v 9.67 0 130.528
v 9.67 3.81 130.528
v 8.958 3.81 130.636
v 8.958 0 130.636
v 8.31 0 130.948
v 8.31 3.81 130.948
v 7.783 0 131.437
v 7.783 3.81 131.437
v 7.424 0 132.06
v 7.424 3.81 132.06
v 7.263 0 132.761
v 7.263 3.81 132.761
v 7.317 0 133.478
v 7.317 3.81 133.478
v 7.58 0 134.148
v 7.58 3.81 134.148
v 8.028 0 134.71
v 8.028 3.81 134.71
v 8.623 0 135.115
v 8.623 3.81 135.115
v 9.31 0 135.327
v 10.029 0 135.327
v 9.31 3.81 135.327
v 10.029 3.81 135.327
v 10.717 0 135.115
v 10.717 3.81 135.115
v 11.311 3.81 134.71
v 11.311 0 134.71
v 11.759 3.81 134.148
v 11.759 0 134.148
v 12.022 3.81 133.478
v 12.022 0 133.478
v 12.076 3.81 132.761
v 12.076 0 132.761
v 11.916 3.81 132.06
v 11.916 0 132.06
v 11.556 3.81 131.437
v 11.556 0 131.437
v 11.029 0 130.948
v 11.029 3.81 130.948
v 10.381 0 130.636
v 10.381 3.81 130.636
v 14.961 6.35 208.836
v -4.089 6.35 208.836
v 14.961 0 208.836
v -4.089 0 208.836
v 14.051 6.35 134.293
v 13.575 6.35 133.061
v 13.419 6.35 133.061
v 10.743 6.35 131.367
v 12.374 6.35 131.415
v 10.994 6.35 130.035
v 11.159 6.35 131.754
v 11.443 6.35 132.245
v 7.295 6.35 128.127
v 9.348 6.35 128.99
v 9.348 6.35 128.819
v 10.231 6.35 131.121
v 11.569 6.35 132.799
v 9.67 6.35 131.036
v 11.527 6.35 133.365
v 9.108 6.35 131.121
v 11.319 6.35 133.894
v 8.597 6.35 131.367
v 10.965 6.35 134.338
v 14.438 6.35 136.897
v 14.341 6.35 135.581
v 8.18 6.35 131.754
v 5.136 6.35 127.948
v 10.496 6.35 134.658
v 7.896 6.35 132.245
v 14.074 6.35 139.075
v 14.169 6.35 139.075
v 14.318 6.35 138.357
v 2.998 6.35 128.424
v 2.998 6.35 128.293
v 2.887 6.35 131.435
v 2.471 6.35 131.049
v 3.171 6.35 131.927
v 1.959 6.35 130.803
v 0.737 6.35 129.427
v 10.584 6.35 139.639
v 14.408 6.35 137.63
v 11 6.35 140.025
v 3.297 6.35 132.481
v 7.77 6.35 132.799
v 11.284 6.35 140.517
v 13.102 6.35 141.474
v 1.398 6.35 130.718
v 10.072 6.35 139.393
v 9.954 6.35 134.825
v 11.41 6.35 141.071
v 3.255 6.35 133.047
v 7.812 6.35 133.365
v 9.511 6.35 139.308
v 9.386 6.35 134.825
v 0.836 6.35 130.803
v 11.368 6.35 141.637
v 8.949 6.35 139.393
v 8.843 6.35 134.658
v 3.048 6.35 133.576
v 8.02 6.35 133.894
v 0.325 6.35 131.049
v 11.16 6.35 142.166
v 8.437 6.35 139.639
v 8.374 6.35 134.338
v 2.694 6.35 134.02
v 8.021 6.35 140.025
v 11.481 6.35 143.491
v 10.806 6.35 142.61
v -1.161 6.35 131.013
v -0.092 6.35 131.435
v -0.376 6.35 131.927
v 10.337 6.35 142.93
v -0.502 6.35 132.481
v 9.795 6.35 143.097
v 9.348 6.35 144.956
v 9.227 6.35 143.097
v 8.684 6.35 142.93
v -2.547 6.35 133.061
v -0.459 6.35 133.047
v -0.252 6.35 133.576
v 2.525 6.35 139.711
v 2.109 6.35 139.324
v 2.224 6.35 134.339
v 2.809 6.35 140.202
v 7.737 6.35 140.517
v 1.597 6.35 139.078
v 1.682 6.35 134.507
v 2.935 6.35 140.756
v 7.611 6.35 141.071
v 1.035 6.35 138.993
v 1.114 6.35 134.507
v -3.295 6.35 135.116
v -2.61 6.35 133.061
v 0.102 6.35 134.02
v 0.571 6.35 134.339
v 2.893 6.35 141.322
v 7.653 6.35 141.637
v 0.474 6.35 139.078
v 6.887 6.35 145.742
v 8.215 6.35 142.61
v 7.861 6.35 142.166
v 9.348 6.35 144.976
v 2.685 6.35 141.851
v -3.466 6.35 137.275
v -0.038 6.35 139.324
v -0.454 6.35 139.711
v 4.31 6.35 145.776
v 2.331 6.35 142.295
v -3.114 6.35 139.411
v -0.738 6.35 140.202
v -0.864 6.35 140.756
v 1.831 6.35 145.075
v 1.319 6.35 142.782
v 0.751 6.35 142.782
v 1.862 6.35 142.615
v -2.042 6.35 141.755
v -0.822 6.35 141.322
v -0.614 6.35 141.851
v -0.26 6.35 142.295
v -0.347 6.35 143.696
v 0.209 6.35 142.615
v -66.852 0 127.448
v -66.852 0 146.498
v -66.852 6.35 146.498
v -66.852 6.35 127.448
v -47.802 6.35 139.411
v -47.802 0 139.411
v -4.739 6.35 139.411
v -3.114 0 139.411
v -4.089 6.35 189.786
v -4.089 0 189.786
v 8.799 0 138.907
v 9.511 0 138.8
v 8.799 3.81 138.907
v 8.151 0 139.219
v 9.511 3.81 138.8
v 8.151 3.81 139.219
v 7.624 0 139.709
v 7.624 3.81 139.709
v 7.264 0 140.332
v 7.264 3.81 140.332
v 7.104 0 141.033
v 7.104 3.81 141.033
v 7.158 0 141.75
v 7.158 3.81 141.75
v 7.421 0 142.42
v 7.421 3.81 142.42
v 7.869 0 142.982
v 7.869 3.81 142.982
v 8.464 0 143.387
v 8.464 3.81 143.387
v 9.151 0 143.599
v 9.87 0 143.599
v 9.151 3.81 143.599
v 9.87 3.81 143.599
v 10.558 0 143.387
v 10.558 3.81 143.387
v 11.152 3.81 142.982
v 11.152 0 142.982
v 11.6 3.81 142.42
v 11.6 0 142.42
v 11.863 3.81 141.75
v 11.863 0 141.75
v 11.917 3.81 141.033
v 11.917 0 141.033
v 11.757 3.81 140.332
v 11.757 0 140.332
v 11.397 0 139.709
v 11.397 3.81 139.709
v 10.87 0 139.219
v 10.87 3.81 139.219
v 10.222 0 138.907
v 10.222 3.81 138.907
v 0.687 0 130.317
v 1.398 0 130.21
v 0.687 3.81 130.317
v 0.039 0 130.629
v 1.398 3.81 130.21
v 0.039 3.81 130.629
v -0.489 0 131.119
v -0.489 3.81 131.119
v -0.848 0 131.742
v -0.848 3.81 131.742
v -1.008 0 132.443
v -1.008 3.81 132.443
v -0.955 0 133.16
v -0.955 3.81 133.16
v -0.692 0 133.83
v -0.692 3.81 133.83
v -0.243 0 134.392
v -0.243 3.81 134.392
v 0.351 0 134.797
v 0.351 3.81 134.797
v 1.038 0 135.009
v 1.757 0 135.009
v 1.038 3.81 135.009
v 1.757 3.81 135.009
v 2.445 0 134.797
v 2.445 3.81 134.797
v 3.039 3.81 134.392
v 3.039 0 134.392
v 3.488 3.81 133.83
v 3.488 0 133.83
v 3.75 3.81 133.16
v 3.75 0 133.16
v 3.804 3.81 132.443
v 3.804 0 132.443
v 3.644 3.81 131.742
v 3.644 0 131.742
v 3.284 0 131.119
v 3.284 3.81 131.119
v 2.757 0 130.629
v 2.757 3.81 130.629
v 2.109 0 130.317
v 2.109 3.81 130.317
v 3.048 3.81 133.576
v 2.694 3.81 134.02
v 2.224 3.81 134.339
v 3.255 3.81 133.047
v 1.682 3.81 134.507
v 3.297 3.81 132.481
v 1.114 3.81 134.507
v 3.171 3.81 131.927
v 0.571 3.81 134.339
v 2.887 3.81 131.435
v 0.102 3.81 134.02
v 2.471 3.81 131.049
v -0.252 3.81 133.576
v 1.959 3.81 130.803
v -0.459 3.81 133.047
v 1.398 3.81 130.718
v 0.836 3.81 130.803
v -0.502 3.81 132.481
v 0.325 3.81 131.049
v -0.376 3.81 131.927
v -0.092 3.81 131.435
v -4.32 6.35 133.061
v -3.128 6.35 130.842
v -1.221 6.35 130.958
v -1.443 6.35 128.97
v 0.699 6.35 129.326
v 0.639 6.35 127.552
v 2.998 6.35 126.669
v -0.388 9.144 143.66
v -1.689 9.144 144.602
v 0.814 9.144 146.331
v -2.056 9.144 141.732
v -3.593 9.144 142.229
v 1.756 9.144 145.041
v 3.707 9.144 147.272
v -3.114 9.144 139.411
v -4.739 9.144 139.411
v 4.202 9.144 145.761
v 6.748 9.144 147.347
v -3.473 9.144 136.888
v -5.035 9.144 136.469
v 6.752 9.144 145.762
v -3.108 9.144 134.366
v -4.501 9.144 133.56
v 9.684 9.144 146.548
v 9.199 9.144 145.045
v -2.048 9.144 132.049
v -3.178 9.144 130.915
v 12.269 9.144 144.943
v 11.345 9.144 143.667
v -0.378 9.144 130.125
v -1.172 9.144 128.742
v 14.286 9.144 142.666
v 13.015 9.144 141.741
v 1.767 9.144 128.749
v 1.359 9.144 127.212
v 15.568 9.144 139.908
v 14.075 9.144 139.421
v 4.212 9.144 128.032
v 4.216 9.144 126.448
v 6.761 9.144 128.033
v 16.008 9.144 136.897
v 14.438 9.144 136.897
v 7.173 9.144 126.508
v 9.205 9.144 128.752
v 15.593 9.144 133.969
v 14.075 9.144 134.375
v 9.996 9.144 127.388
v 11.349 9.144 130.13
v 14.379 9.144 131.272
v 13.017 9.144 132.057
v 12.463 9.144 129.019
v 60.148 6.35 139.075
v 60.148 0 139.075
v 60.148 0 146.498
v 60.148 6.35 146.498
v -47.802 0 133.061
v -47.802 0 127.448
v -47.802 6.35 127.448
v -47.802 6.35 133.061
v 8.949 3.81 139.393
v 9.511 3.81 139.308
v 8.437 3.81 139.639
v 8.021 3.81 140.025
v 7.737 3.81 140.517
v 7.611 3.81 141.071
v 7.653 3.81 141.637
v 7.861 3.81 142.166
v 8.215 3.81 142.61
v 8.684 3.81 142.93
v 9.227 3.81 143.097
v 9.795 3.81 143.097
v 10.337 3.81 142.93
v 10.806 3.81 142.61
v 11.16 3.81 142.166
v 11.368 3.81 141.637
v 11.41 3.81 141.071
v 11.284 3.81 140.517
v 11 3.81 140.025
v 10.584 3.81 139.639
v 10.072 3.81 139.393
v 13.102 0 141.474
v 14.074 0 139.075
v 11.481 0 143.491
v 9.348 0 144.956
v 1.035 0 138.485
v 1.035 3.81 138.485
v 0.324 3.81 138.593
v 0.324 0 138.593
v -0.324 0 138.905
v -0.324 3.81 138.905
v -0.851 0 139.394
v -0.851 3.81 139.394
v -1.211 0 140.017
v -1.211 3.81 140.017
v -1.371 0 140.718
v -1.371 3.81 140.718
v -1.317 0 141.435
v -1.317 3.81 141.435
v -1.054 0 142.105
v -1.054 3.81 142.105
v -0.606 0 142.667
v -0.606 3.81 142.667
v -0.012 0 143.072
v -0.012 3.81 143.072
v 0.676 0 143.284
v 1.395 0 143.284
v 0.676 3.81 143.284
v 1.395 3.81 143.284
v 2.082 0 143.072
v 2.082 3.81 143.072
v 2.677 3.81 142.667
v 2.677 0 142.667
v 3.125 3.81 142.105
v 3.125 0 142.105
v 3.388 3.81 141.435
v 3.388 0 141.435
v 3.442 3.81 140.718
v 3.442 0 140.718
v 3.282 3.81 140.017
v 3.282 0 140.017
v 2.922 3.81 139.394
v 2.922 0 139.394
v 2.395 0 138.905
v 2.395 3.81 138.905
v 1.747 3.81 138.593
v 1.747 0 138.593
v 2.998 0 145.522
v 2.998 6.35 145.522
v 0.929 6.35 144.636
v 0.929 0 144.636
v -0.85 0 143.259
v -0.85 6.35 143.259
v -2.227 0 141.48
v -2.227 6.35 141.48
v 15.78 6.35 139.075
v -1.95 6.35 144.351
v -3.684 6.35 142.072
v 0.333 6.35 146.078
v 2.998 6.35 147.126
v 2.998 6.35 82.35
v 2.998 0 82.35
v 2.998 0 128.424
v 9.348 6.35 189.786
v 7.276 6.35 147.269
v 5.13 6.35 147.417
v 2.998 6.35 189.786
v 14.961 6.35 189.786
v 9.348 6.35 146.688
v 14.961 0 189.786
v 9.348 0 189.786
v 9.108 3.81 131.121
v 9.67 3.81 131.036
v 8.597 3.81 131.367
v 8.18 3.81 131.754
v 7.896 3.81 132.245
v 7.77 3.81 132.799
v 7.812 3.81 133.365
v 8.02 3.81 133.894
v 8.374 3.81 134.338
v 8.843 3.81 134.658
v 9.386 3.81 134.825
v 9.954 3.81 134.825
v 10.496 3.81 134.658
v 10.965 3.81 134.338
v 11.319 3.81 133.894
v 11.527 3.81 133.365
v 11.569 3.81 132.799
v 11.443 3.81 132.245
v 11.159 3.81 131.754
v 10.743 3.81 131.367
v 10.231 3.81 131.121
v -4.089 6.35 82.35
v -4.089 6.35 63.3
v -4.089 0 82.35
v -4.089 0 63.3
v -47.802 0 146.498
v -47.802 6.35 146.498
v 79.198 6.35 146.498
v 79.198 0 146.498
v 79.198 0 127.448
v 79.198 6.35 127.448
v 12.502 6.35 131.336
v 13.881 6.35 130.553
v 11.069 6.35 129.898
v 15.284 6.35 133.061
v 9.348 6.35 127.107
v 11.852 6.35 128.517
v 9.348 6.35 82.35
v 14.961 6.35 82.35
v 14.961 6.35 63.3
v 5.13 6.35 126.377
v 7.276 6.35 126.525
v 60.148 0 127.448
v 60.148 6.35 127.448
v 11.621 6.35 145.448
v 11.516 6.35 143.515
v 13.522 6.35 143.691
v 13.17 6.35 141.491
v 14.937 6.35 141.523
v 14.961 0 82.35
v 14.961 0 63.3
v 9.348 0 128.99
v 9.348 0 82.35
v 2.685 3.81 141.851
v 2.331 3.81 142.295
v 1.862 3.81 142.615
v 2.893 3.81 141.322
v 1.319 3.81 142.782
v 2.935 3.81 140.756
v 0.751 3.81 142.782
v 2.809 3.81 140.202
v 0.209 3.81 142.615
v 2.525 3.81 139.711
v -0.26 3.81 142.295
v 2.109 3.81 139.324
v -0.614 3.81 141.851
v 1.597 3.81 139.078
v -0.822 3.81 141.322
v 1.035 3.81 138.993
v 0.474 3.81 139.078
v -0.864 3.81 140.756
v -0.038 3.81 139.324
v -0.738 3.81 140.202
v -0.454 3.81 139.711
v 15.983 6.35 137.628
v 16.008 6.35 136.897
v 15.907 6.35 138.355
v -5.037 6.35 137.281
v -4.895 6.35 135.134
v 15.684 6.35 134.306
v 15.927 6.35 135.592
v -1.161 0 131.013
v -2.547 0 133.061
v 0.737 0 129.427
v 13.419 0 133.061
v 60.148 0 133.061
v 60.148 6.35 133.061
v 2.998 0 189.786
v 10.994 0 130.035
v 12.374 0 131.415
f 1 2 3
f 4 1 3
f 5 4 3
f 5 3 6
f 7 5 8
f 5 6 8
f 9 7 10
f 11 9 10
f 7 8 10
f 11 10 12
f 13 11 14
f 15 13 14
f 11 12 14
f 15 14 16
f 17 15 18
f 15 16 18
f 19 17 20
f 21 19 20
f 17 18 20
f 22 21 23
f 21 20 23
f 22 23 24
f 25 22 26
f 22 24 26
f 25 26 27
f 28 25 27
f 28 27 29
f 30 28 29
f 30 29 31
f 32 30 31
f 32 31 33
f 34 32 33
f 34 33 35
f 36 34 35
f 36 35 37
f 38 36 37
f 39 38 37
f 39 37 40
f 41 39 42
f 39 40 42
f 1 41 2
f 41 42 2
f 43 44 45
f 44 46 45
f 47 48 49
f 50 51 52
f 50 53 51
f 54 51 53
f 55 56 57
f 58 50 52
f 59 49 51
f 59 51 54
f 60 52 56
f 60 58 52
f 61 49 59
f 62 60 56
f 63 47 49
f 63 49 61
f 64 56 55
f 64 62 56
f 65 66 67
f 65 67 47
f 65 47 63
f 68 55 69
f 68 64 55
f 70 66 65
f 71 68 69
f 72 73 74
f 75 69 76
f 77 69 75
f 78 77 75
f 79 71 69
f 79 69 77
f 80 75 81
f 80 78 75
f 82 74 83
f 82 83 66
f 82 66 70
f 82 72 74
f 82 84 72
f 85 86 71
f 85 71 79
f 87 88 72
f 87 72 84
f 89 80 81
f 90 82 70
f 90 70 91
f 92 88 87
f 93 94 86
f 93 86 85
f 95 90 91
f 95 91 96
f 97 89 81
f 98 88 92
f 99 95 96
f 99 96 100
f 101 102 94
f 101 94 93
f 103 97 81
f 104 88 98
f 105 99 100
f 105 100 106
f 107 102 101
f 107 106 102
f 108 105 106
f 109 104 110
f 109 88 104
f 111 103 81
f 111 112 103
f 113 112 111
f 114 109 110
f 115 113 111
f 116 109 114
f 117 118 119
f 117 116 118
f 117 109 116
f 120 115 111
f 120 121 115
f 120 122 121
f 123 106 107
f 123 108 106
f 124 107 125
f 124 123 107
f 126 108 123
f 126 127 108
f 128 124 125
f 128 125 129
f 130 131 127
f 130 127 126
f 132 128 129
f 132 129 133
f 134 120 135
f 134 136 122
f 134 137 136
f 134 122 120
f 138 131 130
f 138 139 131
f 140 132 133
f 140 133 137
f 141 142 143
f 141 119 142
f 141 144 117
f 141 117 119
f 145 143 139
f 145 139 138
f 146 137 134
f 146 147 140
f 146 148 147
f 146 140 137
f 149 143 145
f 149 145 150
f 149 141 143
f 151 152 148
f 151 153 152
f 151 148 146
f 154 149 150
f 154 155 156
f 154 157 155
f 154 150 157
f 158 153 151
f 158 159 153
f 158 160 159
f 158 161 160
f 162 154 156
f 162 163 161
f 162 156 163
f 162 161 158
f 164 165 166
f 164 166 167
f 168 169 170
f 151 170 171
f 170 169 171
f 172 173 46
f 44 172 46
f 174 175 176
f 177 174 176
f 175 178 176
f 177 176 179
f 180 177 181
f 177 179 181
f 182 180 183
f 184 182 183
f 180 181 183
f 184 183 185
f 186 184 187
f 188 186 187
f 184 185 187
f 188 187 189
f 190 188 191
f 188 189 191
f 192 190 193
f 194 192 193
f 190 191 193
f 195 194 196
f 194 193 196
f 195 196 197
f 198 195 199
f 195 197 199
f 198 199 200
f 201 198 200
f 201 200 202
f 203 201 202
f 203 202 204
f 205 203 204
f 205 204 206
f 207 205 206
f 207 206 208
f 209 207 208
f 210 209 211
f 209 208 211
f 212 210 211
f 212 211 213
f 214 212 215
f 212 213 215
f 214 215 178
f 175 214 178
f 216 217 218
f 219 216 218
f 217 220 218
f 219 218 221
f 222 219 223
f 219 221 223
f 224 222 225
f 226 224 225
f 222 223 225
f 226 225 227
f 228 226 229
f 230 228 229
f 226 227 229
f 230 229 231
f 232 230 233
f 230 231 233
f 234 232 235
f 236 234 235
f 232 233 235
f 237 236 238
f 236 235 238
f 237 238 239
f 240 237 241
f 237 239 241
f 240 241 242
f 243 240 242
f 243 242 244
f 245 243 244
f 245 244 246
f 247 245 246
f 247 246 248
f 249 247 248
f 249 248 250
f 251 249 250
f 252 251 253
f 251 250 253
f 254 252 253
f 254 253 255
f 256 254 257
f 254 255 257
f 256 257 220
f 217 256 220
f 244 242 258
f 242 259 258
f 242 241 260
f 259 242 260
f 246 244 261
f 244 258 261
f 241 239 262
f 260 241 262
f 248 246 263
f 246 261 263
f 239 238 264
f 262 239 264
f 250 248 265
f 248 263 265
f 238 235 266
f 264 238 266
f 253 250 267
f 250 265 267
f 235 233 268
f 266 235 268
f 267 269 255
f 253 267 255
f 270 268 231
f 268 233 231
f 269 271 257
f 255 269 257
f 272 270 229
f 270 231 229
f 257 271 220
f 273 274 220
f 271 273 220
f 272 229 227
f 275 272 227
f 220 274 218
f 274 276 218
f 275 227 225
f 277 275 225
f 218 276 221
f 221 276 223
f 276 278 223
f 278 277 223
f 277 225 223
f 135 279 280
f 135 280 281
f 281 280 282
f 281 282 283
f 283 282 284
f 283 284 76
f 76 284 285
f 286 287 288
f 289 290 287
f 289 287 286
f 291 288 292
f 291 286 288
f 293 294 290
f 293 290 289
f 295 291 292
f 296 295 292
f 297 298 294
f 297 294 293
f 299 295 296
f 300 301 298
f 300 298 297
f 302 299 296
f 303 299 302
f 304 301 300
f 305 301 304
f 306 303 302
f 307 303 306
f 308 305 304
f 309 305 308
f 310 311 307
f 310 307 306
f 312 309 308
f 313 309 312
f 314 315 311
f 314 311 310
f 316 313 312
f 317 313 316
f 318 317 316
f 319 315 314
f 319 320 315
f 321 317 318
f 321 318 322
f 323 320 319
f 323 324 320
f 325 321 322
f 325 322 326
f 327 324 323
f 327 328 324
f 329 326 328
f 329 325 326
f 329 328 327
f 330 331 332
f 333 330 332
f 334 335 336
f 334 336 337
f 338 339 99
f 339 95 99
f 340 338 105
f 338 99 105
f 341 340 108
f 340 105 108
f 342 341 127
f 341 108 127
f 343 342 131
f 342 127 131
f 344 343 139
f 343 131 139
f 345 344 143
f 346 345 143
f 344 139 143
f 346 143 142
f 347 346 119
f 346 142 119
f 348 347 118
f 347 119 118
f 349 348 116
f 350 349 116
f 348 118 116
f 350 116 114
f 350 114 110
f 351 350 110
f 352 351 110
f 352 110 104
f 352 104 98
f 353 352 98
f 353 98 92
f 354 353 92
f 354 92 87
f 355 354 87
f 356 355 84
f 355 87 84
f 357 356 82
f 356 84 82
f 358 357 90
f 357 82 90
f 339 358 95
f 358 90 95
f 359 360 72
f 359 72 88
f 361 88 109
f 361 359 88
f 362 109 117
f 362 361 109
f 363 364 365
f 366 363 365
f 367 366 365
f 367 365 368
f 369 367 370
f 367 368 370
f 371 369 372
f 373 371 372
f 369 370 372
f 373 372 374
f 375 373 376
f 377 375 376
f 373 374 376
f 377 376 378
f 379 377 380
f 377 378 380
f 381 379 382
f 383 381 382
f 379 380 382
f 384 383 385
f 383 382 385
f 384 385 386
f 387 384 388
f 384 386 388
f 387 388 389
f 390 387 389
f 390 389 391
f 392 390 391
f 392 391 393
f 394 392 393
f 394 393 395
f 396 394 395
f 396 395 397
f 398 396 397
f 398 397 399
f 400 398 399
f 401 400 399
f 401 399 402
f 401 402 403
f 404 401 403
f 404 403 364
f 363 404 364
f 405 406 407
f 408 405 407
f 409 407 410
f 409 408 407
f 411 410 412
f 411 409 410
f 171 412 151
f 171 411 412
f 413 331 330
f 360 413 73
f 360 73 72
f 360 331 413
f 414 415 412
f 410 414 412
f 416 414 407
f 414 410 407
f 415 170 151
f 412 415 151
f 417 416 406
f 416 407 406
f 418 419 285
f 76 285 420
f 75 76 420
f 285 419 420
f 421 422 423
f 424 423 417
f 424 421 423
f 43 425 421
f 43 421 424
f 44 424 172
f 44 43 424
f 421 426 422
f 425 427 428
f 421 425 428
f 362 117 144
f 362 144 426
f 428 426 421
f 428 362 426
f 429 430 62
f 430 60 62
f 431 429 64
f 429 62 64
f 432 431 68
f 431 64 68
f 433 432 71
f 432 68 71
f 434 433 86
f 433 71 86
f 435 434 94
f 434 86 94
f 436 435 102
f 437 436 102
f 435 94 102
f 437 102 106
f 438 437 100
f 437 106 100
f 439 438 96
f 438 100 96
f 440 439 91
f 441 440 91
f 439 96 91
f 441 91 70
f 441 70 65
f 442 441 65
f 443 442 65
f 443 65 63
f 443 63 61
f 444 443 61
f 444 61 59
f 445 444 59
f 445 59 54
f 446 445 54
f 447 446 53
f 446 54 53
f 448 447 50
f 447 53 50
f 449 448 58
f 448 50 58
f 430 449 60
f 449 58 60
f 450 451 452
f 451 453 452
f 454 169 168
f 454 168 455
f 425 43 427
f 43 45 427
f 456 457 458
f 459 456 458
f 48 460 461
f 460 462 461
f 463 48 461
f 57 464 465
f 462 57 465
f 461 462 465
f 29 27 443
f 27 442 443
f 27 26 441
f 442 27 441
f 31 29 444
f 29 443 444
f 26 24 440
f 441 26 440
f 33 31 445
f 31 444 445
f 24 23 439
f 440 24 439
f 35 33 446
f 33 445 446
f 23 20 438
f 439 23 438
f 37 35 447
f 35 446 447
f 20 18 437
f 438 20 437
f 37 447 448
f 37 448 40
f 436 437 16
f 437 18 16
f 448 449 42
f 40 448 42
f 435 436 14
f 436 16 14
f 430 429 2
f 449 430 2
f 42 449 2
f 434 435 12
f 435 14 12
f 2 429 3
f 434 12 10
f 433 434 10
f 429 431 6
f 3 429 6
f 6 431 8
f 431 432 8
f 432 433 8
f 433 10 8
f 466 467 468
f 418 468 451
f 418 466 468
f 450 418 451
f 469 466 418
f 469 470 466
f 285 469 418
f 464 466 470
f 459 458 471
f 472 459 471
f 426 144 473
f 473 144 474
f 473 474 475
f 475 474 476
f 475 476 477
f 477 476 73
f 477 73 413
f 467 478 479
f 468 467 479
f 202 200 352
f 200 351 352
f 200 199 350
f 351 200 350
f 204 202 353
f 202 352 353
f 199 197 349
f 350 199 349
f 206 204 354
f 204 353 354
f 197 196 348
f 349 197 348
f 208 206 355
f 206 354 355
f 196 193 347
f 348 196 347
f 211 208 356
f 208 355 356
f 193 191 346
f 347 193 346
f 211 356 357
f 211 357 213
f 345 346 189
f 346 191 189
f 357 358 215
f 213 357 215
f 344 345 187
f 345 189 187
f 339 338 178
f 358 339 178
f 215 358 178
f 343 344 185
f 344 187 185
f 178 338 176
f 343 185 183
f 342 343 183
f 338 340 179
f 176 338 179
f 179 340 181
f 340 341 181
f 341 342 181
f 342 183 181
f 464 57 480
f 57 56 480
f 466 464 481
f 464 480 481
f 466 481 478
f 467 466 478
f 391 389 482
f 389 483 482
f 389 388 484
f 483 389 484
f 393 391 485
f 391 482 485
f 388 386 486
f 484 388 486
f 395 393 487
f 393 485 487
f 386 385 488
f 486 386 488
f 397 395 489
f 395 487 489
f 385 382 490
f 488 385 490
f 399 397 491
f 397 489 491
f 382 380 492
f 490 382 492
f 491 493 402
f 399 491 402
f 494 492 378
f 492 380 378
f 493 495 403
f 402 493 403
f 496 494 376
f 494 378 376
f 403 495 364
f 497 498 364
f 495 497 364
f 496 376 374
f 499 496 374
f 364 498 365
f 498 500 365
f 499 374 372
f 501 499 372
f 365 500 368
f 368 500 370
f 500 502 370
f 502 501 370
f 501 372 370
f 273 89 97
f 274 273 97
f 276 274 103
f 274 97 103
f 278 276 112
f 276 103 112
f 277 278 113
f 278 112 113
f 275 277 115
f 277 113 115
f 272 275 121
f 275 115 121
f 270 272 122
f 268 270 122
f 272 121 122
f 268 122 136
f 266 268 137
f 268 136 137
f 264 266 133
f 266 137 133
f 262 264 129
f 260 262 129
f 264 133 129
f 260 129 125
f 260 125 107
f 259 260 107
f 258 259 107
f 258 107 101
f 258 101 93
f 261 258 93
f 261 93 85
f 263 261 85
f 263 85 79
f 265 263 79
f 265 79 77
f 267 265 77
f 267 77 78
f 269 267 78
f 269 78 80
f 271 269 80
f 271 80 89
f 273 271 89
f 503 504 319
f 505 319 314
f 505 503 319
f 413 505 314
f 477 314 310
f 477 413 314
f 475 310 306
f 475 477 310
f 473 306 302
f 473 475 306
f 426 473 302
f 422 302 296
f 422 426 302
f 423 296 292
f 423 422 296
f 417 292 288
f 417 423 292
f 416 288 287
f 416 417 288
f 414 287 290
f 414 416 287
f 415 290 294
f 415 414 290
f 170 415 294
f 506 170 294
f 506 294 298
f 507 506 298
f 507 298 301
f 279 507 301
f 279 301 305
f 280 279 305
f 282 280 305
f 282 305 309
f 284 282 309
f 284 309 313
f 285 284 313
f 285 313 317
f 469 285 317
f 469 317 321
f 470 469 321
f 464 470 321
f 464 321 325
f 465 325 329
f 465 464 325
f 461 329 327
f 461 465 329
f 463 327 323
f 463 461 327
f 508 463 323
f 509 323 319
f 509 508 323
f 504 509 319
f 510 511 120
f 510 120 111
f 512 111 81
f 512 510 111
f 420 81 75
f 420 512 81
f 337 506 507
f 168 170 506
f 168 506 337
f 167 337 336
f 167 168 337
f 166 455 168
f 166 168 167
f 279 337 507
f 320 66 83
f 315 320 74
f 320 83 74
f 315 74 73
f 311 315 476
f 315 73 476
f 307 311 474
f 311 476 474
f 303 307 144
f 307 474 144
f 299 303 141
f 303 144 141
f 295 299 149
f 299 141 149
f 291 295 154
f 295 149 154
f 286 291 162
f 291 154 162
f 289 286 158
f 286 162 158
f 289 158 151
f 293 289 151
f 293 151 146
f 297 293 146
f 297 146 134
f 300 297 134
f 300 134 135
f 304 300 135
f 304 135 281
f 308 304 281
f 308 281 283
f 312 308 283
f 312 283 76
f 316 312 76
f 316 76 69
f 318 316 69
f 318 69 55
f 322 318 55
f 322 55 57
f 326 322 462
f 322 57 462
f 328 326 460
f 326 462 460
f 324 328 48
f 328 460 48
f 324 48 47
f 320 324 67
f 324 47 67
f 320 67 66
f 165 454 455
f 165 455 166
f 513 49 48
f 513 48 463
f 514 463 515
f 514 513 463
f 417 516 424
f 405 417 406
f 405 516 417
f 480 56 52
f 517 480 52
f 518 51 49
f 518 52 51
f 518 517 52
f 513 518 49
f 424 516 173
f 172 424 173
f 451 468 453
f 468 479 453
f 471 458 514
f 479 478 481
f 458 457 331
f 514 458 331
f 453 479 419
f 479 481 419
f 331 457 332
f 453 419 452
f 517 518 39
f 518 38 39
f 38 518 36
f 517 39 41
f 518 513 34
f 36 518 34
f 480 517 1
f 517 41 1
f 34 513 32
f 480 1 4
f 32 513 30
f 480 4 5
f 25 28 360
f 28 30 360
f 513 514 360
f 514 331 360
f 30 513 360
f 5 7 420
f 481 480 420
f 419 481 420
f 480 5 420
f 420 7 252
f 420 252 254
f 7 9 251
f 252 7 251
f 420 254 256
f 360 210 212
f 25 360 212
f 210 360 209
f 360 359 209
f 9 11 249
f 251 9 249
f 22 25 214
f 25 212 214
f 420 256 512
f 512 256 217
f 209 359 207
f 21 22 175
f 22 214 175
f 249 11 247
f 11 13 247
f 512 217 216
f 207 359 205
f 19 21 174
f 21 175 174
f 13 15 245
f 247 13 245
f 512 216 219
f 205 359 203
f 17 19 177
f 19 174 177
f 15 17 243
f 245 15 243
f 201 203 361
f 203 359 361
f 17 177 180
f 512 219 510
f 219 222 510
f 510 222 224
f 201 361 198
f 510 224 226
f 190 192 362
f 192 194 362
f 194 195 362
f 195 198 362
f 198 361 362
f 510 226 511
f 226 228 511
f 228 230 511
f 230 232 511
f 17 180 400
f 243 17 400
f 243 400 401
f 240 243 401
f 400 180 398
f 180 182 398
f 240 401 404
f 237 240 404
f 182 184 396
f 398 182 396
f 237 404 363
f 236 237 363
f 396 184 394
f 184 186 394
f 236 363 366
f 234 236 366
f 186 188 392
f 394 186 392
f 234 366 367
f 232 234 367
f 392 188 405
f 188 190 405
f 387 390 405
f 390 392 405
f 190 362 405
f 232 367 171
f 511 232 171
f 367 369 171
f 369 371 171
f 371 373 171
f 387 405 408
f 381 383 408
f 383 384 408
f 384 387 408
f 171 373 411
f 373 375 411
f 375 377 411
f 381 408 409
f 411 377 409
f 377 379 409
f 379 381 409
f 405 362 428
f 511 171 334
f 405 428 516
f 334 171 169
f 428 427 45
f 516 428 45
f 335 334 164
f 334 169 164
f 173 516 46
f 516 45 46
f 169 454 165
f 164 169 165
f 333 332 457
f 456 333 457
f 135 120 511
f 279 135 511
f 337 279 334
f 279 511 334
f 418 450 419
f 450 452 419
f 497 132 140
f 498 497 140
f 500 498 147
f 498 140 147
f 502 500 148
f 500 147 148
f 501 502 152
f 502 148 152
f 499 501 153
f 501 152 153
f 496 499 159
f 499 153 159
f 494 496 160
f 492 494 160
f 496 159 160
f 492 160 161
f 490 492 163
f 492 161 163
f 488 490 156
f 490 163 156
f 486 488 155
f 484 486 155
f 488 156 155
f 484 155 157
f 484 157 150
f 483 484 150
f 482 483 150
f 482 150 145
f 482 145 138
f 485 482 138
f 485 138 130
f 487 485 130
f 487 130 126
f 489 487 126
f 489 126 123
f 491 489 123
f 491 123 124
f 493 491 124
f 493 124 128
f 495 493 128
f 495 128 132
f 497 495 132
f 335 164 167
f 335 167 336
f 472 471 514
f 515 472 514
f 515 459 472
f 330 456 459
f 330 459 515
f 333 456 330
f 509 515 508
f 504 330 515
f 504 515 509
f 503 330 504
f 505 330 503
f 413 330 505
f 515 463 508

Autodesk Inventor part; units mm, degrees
ref_plane "YZ Plane" through (0, 0, 0) normal (1, 0, 0) x (0, 1, 0)
ref_plane "XZ Plane" through (0, 0, 0) normal (0, 1, 0) x (-1, 0, 0)
ref_plane "XY Plane" through (0, 0, 0) normal (0, 0, 1) x (1, 0, 0)
sketch "Sketch1" plane through (0, 0, 0) normal (0, 1, 0) x (-1, 0, 0)
  line L0 (-9.3478, 139.075) -> (-9.3478, 139.4112)
  line L1 (2.5473, 133.0612) -> (47.8022, 133.0612)
  line L2 (47.8022, 133.0612) -> (47.8022, 139.4112)
  line L3 (47.8022, 139.4112) -> (3.1135, 139.4112)
  line L4 (-2.9978, 139.4112) -> (-2.9978, 139.075)
  line L5 (-13.4187, 133.0612) -> (-60.1478, 133.0612)
  line L6 (-60.1478, 133.0612) -> (-60.1478, 139.075)
  line L7 (-60.1478, 139.075) -> (-14.0737, 139.075)
  line L8 (-9.3478, 189.875) -> (-2.9978, 189.875)
  line L9 (-9.3478, 128.9903) -> (-9.3478, 82.2612)
  line L10 (-9.3478, 82.2612) -> (-2.9978, 82.2612)
  line L11 (-2.9978, 82.2612) -> (-2.9978, 128.4241)
  line L12 (-14.9607, 189.7858) -> (4.0893, 189.7858)
  line L13 (4.0893, 189.7858) -> (4.0893, 208.8358)
  line L14 (4.0893, 208.8358) -> (-14.9607, 208.8358)
  line L15 (-14.9607, 208.8358) -> (-14.9607, 189.7858)
  line L16 (-60.1478, 146.4982) -> (-79.1978, 146.4982)
  line L17 (-79.1978, 146.4982) -> (-79.1978, 127.4482)
  line L18 (-79.1978, 127.4482) -> (-60.1478, 127.4482)
  line L19 (-60.1478, 127.4482) -> (-60.1478, 146.4982)
  line L20 (4.0893, 82.3504) -> (-14.9607, 82.3504)
  line L21 (-14.9607, 82.3504) -> (-14.9607, 63.3004)
  line L22 (-14.9607, 63.3004) -> (4.0893, 63.3004)
  line L23 (4.0893, 63.3004) -> (4.0893, 82.3504)
  line L24 (47.8022, 146.4982) -> (66.8522, 146.4982)
  line L25 (66.8522, 146.4982) -> (66.8522, 127.4482)
  line L26 (66.8522, 127.4482) -> (47.8022, 127.4482)
  line L27 (47.8022, 127.4482) -> (47.8022, 146.4982)
  circle A0 centre (-5.4357, 136.9732) radius 8.89
  line L28 (-9.3478, 139.075) -> (-9.3478, 139.4112)
  line L29 (-9.3478, 144.9562) -> (-9.3478, 189.875)
  line L30 (-2.9978, 189.875) -> (-2.9978, 145.5224)
  line L31 (-2.9978, 139.4112) -> (-2.9978, 139.075)
extrude "Extrusion1" add sketch "Sketch1" along normal blind 6.35
sketch "Sketch2" plane through (0, 6.35, 0) normal (0, 1, 0) x (1, 0, 0)
  line L0 (-47.8022, -139.4112) -> (-3.1135, -139.4112) projected
  circle A0 centre (5.4822, -136.8972) radius 8.9557
  circle A1 centre (5.4822, -136.8972) radius 10.5259
  point P0 (0, 0)
extrude "Extrusion2" add sketch "Sketch2" along normal blind 2.794
sketch "Sketch3" plane through (0, 6.35, 0) normal (0, 1, 0) x (1, 0, 0)
  point P0 (0, 0)
hole "Hole1" at (1.0354, 0, 140.8984) direction (0, 1, 0) diameter 3.81 end through all counterbore diameter 4.826 counterbore depth 3.81
hole "Hole2" at (9.6697, 0, 132.9413) direction (0, 1, 0) diameter 3.81 end through all counterbore diameter 4.826 counterbore depth 3.81
hole "Hole3" at (9.5106, 0, 141.2132) direction (0, 1, 0) diameter 3.81 end through all counterbore diameter 4.826 counterbore depth 3.81
hole "Hole4" at (1.3978, 0, 132.6231) direction (0, 1, 0) diameter 3.81 end through all counterbore diameter 4.826 counterbore depth 3.81
